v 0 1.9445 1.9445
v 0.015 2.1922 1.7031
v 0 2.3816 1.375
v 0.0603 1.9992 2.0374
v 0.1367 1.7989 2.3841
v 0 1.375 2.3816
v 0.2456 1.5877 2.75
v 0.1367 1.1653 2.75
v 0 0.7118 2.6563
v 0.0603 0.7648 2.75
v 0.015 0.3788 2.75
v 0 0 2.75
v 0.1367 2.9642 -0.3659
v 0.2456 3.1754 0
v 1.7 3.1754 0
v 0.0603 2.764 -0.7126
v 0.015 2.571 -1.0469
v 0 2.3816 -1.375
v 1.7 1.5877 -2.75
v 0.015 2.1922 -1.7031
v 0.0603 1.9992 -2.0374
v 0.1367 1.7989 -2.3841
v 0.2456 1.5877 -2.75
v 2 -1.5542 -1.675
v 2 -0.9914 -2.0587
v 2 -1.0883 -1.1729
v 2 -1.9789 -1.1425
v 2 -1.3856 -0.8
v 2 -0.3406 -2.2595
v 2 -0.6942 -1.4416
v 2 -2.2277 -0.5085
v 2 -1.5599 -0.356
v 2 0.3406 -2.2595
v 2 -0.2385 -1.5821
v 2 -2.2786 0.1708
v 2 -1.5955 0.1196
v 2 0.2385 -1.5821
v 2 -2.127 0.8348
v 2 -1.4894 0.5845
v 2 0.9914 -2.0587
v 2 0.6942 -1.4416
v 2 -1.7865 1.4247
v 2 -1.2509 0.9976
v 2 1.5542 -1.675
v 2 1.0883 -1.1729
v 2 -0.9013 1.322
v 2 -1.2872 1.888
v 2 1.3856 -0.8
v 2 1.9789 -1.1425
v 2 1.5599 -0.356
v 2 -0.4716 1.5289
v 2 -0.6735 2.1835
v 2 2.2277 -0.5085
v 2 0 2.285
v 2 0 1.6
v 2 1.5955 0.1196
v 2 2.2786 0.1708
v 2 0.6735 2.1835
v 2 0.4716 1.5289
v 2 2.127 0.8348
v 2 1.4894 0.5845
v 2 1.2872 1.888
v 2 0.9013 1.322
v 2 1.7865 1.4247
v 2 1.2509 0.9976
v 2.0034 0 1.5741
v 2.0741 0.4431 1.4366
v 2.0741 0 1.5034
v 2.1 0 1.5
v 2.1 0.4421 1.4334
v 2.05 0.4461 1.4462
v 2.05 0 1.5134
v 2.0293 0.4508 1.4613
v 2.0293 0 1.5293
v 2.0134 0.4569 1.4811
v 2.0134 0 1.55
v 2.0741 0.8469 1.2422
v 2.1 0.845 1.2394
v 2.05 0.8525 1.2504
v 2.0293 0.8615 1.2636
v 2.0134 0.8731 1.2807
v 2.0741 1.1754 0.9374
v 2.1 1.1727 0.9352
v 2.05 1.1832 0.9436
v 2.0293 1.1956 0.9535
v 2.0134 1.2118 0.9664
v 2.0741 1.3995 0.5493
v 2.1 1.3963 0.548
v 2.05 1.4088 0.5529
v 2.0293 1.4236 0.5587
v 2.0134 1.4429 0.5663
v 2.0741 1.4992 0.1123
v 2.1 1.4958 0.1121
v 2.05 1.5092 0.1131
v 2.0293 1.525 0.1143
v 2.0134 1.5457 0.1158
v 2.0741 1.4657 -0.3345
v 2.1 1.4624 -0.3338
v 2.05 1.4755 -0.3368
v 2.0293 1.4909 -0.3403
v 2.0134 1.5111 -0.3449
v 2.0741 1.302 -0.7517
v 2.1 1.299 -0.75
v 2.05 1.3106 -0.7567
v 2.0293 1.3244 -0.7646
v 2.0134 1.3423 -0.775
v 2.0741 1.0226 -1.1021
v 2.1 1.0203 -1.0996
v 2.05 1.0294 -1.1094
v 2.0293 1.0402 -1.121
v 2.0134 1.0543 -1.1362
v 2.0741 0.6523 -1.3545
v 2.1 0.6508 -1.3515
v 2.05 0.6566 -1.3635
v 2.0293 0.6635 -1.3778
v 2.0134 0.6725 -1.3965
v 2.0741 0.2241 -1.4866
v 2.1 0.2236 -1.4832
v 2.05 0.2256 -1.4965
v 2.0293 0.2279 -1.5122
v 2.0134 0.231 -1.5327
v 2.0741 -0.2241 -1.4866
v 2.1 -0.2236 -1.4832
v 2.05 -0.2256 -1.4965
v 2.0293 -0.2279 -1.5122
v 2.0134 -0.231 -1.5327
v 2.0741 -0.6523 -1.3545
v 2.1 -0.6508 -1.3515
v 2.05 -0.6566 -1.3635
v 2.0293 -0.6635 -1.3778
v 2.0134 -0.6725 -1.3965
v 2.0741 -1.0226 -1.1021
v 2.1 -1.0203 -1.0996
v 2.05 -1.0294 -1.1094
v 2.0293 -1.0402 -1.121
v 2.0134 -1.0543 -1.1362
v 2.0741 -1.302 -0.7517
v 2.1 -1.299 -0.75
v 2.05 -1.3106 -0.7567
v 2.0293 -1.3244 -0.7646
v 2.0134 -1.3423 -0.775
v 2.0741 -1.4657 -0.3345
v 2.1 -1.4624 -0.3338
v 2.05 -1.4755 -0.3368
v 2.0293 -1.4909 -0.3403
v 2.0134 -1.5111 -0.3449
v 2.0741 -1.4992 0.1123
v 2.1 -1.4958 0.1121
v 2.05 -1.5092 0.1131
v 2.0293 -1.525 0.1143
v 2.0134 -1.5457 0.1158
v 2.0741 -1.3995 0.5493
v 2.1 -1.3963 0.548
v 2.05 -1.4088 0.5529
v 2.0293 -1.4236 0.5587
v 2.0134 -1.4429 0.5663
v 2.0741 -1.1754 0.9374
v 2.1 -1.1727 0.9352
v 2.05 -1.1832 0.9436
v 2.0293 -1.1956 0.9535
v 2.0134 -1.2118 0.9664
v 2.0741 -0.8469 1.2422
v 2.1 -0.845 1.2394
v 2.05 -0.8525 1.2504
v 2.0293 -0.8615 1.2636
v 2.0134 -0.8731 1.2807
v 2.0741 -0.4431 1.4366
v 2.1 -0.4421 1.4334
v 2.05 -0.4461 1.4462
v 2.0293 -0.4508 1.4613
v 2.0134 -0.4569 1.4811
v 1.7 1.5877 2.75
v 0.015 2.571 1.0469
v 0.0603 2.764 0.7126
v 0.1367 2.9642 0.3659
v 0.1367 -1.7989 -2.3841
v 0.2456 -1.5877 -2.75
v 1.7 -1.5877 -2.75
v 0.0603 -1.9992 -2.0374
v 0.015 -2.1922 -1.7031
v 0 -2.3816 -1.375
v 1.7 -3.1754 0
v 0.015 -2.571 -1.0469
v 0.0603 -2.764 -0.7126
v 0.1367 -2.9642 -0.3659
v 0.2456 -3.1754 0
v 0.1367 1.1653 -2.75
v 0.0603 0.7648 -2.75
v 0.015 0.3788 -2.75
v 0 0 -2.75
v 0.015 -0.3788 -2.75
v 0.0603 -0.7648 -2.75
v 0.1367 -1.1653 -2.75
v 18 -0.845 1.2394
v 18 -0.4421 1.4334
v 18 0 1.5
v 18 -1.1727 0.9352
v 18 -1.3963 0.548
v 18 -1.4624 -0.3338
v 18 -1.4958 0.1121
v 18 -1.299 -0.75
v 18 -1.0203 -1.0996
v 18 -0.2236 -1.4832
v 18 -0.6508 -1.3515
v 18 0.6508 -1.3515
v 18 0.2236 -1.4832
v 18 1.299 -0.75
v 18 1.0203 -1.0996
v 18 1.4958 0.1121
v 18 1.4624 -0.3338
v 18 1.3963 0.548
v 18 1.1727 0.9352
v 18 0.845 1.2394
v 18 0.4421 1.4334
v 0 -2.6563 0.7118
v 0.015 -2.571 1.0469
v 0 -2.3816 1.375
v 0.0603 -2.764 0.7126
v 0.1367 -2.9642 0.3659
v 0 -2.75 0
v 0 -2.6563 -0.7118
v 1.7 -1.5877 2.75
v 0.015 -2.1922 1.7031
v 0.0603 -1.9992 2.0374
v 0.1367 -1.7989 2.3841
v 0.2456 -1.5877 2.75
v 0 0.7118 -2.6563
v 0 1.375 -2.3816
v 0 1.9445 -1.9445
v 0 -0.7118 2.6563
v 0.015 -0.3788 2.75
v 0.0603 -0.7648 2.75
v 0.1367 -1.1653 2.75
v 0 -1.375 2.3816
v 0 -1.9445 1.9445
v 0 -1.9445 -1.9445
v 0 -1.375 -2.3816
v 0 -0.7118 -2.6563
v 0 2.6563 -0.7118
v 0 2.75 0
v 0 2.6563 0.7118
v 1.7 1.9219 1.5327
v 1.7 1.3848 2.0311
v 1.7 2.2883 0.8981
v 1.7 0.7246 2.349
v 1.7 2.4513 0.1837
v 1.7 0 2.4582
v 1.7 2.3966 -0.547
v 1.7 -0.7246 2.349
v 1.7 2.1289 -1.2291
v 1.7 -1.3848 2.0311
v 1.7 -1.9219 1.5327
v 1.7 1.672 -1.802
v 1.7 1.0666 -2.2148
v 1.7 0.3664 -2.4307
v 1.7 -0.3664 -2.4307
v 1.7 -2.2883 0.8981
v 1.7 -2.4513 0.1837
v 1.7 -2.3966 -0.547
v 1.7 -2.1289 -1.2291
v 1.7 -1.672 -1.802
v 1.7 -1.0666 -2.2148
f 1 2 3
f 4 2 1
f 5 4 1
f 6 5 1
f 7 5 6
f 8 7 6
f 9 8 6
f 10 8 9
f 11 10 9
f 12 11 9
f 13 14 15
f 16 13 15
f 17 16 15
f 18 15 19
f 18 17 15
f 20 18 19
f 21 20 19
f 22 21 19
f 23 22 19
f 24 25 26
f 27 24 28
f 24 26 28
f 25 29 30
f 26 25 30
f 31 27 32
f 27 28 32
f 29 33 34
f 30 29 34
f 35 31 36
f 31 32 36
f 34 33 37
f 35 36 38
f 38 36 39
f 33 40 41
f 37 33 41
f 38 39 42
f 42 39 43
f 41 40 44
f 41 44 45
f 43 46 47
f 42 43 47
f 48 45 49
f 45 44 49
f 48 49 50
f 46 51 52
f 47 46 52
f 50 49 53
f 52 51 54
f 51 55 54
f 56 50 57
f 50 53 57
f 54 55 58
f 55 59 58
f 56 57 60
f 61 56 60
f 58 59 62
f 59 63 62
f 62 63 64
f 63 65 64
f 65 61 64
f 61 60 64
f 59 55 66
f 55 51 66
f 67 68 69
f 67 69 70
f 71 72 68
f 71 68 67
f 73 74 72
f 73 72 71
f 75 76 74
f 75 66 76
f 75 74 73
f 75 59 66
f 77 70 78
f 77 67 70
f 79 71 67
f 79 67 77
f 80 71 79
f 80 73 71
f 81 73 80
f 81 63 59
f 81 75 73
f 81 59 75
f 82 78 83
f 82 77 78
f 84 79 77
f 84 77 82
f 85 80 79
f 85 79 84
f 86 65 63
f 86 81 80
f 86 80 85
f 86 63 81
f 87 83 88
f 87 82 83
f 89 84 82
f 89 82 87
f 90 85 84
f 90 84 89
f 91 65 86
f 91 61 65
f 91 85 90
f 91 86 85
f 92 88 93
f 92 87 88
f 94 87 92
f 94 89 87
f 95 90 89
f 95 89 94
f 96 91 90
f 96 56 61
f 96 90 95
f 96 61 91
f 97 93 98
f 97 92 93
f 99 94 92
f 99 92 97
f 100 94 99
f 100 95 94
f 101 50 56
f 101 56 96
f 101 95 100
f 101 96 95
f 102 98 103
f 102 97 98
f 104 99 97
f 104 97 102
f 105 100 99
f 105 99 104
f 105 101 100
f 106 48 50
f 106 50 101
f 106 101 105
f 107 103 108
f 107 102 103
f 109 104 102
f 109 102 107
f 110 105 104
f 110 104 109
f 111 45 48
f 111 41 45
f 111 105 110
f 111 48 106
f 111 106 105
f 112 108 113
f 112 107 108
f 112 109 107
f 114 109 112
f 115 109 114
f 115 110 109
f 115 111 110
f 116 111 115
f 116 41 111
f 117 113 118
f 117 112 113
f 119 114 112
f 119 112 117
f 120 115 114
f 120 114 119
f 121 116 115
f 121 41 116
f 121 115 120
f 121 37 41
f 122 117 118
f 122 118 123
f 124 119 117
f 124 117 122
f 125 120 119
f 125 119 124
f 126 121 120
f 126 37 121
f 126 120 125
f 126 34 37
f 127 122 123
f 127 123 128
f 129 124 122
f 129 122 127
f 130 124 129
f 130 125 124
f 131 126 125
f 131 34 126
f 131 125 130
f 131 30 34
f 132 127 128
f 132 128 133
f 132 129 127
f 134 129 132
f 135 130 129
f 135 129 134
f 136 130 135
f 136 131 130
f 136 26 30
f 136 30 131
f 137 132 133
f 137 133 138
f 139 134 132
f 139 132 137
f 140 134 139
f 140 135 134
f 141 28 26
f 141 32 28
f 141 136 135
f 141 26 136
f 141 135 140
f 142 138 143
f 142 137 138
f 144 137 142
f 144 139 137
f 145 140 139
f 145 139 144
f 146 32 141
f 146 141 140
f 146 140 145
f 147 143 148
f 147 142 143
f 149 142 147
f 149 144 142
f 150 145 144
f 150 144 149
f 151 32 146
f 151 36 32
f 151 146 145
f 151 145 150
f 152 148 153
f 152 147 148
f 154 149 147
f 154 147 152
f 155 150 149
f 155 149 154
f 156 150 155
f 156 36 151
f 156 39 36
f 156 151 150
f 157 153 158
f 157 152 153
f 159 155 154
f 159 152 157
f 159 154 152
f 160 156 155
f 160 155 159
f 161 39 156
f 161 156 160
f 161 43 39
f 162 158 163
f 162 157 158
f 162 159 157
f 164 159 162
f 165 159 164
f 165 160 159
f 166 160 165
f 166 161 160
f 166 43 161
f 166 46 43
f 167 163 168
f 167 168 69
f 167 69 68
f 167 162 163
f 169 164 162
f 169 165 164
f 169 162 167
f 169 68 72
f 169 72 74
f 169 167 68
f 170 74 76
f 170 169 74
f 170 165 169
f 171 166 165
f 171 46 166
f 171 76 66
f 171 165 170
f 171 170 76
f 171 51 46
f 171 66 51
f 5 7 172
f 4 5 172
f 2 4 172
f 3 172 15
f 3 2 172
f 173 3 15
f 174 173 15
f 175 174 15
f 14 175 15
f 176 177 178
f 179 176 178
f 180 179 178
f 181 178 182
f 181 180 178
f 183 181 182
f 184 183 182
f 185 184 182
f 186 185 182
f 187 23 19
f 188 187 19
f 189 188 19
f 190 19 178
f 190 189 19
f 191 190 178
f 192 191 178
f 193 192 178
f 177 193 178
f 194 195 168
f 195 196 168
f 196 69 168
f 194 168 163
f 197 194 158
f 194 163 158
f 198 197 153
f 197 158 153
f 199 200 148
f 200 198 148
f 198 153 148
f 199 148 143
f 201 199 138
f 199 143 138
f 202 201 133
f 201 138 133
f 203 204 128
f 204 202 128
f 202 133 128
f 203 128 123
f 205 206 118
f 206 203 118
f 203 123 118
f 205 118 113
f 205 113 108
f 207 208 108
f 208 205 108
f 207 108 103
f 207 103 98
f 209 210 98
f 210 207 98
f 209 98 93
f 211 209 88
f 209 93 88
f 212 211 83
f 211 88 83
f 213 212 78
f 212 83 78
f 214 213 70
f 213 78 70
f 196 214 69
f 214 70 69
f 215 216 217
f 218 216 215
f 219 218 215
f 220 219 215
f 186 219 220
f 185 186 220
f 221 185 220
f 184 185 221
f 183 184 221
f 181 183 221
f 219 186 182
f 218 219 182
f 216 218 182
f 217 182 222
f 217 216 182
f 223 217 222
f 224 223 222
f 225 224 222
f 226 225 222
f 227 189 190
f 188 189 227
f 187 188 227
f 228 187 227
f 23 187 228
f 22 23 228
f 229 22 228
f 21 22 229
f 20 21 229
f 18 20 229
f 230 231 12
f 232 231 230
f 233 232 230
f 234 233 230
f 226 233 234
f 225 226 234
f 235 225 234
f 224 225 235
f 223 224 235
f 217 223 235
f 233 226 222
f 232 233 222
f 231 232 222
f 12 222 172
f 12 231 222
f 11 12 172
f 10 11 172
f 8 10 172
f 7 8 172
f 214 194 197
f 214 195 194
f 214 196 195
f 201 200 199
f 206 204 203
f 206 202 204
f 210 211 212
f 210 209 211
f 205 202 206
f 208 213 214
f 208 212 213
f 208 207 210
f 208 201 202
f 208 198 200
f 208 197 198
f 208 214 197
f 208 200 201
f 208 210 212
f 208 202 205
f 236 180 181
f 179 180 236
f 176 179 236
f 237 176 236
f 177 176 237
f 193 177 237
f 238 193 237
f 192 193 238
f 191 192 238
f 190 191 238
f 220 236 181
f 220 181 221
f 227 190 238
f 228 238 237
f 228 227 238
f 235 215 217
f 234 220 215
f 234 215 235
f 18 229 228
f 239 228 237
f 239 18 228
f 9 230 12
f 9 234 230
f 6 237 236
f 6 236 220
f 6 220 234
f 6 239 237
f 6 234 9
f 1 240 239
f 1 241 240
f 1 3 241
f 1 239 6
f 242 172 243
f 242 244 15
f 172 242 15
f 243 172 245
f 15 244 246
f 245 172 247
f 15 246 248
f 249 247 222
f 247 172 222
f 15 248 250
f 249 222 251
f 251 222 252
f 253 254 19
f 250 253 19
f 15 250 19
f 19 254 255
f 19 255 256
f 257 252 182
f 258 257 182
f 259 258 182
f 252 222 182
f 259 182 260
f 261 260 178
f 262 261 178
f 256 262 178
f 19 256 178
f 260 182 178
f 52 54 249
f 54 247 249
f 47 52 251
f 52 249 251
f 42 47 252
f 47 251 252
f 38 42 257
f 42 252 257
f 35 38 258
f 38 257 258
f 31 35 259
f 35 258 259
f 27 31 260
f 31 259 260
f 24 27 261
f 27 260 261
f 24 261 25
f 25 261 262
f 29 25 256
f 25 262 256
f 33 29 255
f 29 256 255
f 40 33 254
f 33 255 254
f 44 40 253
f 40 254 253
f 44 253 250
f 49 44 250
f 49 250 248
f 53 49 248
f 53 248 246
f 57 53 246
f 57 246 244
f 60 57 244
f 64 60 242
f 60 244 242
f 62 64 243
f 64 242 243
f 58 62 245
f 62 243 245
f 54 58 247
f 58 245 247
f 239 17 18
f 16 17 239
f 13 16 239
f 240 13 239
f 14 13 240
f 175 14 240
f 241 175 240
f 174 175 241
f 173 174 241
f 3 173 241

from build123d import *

# Parameters (mm, degrees)
EXTRUDE_400_DEPTH   = 2
FILLET_1302_R       = 0.1
SKETCH_7_R          = 3.348684761
CUT_EXTRUDE_1_DEPTH = 9


with BuildPart() as part:
    # 草图1 → Extrude 400 (new body)
    with BuildSketch(Plane(origin=(0, 0, 0), x_dir=(0, 0, -1), z_dir=(1, 0, 0))):
        Polygon((2.75, 1.58771324), (2.75, -1.58771324), (0, -3.175426481), (-2.75, -1.58771324), (-2.75, 1.58771324), (0, 3.175426481), align=None)
    extrude(amount=EXTRUDE_400_DEPTH)

    # 草图2 → 凸台-旋转1 (revolve)
    with BuildSketch(Plane.XY, mode=Mode.PRIVATE) as revolve_1_sk:
        Polygon((0, 0), (27, 0), (27, 1.067), (27, 1.5), (0, 1.5), align=None)
    revolve(revolve_1_sk.sketch.rotate(Axis((0, 0, 0), (1, 0, 0)), 90), axis=Axis((0, 0, 0), (1, 0, 0)))

    # 草图3 → 切除-旋转1 (revolve, cut)
    with BuildSketch(Plane.XY):
        Polygon((0, 2.75), (3.132371439, 8.175426481), (3.132371439, 13.175426481), (-10, 13.175426481), (-10, 2.75), align=None)
    revolve(axis=Axis((0, 0, 0), (1, 0, 0)), mode=Mode.SUBTRACT)

    # 草图4 → 切除-旋转3 (revolve, cut)
    with BuildSketch(Plane.XY, mode=Mode.PRIVATE) as cut_revolve_3_sk:
        Polygon((2, 2.285), (1.7, 2.458205081), (1.7, 3.175426481), (2, 3.175426481), align=None)
    revolve(cut_revolve_3_sk.sketch.rotate(Axis((0, 0, 0), (1, 0, 0)), 90), axis=Axis((0, 0, 0), (1, 0, 0)), mode=Mode.SUBTRACT)

    # Fillet 1302
    fillet_1302_edges = [part.edges().sort_by_distance(p)[0] for p in [
        (2, 0, -1.5),
    ]]
    fillet(fillet_1302_edges, radius=FILLET_1302_R)

    # 草图6 → 切除-旋转4 (revolve, cut)
    with BuildSketch(Plane.XY, mode=Mode.PRIVATE) as cut_revolve_4_sk:
        Polygon((26.75, 1.5), (27.25, 1.5), (27, 1.066987298), align=None)
    revolve(cut_revolve_4_sk.sketch.rotate(Axis((0, 0, 0), (1, 0, 0)), 90), axis=Axis((0, 0, 0), (1, 0, 0)), mode=Mode.SUBTRACT)

    # 草图7 → 切除-拉伸1 (cut)
    with BuildSketch(Plane(origin=(27, 0, 0), x_dir=(0, 0, -1), z_dir=(1, 0, 0))):
        Circle(SKETCH_7_R)
    extrude(amount=-CUT_EXTRUDE_1_DEPTH, mode=Mode.SUBTRACT)


solid = part.part
